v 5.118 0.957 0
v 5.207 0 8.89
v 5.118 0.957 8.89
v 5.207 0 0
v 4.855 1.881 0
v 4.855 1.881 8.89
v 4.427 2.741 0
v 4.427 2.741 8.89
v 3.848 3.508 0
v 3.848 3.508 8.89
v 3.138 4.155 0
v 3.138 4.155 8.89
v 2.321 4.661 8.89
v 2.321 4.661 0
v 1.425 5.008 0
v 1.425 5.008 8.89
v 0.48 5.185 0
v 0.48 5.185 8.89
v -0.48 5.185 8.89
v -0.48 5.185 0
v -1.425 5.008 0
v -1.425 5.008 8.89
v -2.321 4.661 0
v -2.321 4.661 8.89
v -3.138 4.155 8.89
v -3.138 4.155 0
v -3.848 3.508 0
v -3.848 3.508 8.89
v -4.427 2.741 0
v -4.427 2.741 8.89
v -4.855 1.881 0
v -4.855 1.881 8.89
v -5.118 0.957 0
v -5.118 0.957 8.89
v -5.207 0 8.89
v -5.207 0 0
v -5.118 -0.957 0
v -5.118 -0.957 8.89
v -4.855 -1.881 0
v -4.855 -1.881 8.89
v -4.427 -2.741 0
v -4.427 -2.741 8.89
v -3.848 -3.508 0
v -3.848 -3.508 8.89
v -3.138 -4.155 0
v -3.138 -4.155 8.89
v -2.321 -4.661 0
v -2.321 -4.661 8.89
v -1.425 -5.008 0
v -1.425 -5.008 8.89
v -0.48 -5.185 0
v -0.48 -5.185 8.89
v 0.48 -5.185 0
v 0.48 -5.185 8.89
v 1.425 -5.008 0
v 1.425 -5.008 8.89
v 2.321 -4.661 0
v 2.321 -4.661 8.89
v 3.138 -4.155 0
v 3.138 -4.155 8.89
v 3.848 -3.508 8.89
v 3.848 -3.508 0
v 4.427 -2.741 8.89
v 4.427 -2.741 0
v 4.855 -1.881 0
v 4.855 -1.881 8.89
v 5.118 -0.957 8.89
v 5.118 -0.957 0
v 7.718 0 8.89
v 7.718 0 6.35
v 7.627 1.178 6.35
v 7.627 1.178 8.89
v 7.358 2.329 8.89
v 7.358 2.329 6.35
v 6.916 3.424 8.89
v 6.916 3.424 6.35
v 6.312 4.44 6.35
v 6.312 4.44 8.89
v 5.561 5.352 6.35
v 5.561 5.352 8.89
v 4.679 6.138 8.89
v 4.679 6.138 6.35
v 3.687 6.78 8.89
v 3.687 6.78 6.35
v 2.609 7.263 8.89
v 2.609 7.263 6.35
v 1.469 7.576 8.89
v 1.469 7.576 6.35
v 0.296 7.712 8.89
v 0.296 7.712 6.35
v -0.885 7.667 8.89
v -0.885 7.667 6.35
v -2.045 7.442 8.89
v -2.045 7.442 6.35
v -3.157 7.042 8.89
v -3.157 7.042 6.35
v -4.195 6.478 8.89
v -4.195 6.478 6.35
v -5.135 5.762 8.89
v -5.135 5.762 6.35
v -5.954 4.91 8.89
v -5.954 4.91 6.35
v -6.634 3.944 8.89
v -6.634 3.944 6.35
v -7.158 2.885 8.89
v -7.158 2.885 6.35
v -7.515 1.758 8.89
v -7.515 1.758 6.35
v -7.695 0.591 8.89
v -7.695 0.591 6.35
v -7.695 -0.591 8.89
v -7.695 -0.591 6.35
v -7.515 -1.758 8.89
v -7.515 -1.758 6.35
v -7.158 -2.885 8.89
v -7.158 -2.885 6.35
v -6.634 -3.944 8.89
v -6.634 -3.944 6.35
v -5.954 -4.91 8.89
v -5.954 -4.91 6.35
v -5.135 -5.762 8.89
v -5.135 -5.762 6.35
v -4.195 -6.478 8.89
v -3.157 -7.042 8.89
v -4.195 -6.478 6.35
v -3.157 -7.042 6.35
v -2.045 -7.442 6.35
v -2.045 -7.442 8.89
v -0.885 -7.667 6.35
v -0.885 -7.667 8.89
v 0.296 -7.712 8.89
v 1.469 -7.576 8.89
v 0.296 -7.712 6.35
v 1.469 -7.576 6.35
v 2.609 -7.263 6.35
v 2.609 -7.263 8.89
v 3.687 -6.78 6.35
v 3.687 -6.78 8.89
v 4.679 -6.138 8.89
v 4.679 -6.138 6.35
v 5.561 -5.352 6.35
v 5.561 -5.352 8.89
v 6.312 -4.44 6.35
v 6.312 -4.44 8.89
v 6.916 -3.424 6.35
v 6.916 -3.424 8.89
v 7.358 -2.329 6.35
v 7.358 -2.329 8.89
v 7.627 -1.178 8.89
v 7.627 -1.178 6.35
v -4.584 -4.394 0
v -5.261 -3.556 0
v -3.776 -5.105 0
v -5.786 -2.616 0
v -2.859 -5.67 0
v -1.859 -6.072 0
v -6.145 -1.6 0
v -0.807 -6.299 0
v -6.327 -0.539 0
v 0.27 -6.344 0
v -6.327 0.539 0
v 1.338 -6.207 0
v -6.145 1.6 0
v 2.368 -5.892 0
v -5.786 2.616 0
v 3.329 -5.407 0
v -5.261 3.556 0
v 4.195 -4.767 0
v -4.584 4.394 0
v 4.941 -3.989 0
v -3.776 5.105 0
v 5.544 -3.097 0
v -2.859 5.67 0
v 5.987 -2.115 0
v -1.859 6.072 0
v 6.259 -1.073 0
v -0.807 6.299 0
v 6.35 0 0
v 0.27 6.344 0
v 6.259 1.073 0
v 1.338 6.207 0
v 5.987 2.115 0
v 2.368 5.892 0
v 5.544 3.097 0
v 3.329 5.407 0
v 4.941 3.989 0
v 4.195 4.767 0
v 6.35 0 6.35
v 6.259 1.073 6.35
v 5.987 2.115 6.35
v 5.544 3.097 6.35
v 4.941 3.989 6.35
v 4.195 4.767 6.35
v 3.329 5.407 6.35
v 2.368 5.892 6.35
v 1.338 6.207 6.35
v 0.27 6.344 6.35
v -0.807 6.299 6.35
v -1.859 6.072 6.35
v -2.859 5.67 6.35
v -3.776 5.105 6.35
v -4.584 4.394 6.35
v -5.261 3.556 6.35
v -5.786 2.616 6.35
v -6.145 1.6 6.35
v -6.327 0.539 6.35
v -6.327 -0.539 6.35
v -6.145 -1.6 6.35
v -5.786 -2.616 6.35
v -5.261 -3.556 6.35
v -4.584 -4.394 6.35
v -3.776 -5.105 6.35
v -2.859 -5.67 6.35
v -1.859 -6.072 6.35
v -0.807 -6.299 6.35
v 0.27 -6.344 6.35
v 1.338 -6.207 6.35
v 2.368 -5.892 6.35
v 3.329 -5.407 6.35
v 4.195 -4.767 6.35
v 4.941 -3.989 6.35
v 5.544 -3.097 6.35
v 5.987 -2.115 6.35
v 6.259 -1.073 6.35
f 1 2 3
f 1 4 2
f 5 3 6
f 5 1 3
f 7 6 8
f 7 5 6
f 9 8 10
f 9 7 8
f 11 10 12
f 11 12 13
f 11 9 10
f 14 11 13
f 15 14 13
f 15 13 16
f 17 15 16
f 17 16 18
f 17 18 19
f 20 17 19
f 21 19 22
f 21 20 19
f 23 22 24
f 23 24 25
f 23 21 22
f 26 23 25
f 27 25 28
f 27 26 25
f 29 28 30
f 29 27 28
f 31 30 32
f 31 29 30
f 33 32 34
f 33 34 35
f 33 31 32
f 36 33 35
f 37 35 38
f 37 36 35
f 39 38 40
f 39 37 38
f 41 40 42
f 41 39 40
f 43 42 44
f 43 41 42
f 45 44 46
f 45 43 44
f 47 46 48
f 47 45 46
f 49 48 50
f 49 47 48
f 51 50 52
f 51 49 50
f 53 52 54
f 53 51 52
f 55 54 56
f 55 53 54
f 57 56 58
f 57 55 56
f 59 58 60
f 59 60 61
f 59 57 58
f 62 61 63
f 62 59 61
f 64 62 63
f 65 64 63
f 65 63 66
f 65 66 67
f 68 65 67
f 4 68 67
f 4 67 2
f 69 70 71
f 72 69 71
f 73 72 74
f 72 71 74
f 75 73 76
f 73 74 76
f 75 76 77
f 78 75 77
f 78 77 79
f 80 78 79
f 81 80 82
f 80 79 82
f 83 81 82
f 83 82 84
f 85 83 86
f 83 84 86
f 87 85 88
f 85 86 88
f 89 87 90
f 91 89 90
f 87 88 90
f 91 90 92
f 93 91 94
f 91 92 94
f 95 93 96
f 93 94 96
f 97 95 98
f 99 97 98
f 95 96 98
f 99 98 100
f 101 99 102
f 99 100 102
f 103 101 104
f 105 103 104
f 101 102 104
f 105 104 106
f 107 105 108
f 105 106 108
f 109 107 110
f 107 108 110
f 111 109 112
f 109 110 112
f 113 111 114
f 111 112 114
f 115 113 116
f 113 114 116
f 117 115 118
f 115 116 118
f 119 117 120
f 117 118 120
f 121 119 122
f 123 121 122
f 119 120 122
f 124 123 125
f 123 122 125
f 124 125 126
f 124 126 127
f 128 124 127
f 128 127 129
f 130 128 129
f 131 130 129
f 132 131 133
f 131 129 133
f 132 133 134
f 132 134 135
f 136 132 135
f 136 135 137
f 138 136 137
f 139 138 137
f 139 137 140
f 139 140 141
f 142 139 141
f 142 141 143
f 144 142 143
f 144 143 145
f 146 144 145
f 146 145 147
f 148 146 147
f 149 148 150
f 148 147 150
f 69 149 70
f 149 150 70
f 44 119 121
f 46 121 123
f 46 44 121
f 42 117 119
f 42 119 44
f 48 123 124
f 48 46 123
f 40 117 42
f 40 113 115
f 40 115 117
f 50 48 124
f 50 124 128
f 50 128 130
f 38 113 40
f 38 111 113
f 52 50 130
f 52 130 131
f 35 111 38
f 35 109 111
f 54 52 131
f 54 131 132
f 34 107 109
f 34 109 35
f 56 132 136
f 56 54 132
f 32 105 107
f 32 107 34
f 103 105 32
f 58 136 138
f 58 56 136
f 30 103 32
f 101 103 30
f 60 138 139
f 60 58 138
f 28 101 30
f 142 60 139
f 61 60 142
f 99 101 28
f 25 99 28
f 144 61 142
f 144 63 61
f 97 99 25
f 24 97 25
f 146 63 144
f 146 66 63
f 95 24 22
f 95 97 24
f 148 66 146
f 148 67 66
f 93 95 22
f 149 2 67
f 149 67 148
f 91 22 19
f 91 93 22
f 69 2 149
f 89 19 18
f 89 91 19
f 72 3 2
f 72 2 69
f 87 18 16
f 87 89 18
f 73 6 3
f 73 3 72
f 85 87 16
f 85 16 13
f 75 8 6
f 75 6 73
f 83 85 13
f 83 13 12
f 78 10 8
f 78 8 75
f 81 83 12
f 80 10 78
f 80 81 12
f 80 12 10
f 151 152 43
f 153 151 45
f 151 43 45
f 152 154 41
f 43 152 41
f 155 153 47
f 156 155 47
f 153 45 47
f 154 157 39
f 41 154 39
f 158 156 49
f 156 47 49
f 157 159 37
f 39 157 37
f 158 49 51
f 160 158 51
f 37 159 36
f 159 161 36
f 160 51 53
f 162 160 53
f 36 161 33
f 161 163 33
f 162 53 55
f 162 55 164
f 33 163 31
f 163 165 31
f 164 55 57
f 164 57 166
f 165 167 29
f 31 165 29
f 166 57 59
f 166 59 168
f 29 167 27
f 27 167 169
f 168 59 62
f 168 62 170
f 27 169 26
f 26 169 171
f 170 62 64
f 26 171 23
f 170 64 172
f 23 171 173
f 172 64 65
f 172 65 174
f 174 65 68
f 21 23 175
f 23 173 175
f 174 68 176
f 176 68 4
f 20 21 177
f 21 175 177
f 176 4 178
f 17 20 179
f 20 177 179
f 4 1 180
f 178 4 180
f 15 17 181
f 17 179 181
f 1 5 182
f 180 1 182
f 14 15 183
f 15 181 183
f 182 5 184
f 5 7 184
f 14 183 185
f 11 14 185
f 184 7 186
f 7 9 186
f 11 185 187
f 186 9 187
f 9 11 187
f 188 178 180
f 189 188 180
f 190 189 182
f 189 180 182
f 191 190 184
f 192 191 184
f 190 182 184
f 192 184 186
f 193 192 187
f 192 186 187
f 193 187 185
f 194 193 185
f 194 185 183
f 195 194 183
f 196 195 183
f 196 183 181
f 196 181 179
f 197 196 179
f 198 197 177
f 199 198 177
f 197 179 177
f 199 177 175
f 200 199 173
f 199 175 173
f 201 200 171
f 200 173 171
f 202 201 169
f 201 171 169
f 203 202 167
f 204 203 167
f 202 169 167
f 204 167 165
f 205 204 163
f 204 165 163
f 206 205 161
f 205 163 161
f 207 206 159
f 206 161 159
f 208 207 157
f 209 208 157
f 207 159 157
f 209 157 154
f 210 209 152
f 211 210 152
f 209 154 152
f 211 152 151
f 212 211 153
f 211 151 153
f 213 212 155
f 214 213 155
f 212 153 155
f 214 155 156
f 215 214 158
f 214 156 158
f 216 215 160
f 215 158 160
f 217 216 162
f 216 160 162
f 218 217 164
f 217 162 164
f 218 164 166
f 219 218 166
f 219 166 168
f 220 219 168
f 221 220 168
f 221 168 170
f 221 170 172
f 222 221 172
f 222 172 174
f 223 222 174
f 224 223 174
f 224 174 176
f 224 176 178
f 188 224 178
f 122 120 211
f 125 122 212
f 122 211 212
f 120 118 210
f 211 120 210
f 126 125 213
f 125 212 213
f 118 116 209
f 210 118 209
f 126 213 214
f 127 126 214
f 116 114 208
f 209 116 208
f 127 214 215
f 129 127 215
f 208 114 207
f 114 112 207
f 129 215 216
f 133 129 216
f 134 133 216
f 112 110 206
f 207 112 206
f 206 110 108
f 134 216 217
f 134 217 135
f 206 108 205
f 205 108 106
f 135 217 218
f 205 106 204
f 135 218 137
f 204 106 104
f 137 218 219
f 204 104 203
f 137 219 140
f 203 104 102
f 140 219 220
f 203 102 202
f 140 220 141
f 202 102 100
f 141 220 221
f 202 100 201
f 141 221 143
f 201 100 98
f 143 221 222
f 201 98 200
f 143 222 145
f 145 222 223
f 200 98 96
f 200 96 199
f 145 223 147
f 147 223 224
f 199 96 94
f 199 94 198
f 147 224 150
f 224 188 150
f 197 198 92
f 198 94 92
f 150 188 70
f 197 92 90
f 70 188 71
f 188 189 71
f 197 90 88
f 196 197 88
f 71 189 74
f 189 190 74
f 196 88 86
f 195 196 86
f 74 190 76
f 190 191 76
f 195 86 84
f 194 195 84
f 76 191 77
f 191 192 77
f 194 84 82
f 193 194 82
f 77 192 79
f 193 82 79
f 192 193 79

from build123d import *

# Parameters (mm, degrees)
F0_R     = 6.35
F0_R_2   = 5.207
F1_DEPTH = 6.35
F2_R     = 7.7175141939
F2_R_2   = 6.35
F3_DEPTH = 2.54
F4_DEPTH = 2.54


with BuildPart() as f1:
    # F0 (on Top) → F1 (new body)
    with BuildSketch(Plane.XY):
        Circle(F0_R)
        Circle(F0_R_2, mode=Mode.SUBTRACT)
    extrude(amount=F1_DEPTH)

    # F2 (on face) → F3 (join)
    with BuildSketch(Plane.XY.offset(6.35)):
        Circle(F2_R)
        Circle(F2_R_2, mode=Mode.SUBTRACT)
    extrude(amount=F3_DEPTH)

    # F4 (add): a face of the model
    f4_faces = [f1.faces().sort_by_distance(p)[0] for p in [
        (-6.1703948776, 0, 6.35),
    ]]
    extrude(f4_faces, amount=F4_DEPTH)


solid = f1.part
